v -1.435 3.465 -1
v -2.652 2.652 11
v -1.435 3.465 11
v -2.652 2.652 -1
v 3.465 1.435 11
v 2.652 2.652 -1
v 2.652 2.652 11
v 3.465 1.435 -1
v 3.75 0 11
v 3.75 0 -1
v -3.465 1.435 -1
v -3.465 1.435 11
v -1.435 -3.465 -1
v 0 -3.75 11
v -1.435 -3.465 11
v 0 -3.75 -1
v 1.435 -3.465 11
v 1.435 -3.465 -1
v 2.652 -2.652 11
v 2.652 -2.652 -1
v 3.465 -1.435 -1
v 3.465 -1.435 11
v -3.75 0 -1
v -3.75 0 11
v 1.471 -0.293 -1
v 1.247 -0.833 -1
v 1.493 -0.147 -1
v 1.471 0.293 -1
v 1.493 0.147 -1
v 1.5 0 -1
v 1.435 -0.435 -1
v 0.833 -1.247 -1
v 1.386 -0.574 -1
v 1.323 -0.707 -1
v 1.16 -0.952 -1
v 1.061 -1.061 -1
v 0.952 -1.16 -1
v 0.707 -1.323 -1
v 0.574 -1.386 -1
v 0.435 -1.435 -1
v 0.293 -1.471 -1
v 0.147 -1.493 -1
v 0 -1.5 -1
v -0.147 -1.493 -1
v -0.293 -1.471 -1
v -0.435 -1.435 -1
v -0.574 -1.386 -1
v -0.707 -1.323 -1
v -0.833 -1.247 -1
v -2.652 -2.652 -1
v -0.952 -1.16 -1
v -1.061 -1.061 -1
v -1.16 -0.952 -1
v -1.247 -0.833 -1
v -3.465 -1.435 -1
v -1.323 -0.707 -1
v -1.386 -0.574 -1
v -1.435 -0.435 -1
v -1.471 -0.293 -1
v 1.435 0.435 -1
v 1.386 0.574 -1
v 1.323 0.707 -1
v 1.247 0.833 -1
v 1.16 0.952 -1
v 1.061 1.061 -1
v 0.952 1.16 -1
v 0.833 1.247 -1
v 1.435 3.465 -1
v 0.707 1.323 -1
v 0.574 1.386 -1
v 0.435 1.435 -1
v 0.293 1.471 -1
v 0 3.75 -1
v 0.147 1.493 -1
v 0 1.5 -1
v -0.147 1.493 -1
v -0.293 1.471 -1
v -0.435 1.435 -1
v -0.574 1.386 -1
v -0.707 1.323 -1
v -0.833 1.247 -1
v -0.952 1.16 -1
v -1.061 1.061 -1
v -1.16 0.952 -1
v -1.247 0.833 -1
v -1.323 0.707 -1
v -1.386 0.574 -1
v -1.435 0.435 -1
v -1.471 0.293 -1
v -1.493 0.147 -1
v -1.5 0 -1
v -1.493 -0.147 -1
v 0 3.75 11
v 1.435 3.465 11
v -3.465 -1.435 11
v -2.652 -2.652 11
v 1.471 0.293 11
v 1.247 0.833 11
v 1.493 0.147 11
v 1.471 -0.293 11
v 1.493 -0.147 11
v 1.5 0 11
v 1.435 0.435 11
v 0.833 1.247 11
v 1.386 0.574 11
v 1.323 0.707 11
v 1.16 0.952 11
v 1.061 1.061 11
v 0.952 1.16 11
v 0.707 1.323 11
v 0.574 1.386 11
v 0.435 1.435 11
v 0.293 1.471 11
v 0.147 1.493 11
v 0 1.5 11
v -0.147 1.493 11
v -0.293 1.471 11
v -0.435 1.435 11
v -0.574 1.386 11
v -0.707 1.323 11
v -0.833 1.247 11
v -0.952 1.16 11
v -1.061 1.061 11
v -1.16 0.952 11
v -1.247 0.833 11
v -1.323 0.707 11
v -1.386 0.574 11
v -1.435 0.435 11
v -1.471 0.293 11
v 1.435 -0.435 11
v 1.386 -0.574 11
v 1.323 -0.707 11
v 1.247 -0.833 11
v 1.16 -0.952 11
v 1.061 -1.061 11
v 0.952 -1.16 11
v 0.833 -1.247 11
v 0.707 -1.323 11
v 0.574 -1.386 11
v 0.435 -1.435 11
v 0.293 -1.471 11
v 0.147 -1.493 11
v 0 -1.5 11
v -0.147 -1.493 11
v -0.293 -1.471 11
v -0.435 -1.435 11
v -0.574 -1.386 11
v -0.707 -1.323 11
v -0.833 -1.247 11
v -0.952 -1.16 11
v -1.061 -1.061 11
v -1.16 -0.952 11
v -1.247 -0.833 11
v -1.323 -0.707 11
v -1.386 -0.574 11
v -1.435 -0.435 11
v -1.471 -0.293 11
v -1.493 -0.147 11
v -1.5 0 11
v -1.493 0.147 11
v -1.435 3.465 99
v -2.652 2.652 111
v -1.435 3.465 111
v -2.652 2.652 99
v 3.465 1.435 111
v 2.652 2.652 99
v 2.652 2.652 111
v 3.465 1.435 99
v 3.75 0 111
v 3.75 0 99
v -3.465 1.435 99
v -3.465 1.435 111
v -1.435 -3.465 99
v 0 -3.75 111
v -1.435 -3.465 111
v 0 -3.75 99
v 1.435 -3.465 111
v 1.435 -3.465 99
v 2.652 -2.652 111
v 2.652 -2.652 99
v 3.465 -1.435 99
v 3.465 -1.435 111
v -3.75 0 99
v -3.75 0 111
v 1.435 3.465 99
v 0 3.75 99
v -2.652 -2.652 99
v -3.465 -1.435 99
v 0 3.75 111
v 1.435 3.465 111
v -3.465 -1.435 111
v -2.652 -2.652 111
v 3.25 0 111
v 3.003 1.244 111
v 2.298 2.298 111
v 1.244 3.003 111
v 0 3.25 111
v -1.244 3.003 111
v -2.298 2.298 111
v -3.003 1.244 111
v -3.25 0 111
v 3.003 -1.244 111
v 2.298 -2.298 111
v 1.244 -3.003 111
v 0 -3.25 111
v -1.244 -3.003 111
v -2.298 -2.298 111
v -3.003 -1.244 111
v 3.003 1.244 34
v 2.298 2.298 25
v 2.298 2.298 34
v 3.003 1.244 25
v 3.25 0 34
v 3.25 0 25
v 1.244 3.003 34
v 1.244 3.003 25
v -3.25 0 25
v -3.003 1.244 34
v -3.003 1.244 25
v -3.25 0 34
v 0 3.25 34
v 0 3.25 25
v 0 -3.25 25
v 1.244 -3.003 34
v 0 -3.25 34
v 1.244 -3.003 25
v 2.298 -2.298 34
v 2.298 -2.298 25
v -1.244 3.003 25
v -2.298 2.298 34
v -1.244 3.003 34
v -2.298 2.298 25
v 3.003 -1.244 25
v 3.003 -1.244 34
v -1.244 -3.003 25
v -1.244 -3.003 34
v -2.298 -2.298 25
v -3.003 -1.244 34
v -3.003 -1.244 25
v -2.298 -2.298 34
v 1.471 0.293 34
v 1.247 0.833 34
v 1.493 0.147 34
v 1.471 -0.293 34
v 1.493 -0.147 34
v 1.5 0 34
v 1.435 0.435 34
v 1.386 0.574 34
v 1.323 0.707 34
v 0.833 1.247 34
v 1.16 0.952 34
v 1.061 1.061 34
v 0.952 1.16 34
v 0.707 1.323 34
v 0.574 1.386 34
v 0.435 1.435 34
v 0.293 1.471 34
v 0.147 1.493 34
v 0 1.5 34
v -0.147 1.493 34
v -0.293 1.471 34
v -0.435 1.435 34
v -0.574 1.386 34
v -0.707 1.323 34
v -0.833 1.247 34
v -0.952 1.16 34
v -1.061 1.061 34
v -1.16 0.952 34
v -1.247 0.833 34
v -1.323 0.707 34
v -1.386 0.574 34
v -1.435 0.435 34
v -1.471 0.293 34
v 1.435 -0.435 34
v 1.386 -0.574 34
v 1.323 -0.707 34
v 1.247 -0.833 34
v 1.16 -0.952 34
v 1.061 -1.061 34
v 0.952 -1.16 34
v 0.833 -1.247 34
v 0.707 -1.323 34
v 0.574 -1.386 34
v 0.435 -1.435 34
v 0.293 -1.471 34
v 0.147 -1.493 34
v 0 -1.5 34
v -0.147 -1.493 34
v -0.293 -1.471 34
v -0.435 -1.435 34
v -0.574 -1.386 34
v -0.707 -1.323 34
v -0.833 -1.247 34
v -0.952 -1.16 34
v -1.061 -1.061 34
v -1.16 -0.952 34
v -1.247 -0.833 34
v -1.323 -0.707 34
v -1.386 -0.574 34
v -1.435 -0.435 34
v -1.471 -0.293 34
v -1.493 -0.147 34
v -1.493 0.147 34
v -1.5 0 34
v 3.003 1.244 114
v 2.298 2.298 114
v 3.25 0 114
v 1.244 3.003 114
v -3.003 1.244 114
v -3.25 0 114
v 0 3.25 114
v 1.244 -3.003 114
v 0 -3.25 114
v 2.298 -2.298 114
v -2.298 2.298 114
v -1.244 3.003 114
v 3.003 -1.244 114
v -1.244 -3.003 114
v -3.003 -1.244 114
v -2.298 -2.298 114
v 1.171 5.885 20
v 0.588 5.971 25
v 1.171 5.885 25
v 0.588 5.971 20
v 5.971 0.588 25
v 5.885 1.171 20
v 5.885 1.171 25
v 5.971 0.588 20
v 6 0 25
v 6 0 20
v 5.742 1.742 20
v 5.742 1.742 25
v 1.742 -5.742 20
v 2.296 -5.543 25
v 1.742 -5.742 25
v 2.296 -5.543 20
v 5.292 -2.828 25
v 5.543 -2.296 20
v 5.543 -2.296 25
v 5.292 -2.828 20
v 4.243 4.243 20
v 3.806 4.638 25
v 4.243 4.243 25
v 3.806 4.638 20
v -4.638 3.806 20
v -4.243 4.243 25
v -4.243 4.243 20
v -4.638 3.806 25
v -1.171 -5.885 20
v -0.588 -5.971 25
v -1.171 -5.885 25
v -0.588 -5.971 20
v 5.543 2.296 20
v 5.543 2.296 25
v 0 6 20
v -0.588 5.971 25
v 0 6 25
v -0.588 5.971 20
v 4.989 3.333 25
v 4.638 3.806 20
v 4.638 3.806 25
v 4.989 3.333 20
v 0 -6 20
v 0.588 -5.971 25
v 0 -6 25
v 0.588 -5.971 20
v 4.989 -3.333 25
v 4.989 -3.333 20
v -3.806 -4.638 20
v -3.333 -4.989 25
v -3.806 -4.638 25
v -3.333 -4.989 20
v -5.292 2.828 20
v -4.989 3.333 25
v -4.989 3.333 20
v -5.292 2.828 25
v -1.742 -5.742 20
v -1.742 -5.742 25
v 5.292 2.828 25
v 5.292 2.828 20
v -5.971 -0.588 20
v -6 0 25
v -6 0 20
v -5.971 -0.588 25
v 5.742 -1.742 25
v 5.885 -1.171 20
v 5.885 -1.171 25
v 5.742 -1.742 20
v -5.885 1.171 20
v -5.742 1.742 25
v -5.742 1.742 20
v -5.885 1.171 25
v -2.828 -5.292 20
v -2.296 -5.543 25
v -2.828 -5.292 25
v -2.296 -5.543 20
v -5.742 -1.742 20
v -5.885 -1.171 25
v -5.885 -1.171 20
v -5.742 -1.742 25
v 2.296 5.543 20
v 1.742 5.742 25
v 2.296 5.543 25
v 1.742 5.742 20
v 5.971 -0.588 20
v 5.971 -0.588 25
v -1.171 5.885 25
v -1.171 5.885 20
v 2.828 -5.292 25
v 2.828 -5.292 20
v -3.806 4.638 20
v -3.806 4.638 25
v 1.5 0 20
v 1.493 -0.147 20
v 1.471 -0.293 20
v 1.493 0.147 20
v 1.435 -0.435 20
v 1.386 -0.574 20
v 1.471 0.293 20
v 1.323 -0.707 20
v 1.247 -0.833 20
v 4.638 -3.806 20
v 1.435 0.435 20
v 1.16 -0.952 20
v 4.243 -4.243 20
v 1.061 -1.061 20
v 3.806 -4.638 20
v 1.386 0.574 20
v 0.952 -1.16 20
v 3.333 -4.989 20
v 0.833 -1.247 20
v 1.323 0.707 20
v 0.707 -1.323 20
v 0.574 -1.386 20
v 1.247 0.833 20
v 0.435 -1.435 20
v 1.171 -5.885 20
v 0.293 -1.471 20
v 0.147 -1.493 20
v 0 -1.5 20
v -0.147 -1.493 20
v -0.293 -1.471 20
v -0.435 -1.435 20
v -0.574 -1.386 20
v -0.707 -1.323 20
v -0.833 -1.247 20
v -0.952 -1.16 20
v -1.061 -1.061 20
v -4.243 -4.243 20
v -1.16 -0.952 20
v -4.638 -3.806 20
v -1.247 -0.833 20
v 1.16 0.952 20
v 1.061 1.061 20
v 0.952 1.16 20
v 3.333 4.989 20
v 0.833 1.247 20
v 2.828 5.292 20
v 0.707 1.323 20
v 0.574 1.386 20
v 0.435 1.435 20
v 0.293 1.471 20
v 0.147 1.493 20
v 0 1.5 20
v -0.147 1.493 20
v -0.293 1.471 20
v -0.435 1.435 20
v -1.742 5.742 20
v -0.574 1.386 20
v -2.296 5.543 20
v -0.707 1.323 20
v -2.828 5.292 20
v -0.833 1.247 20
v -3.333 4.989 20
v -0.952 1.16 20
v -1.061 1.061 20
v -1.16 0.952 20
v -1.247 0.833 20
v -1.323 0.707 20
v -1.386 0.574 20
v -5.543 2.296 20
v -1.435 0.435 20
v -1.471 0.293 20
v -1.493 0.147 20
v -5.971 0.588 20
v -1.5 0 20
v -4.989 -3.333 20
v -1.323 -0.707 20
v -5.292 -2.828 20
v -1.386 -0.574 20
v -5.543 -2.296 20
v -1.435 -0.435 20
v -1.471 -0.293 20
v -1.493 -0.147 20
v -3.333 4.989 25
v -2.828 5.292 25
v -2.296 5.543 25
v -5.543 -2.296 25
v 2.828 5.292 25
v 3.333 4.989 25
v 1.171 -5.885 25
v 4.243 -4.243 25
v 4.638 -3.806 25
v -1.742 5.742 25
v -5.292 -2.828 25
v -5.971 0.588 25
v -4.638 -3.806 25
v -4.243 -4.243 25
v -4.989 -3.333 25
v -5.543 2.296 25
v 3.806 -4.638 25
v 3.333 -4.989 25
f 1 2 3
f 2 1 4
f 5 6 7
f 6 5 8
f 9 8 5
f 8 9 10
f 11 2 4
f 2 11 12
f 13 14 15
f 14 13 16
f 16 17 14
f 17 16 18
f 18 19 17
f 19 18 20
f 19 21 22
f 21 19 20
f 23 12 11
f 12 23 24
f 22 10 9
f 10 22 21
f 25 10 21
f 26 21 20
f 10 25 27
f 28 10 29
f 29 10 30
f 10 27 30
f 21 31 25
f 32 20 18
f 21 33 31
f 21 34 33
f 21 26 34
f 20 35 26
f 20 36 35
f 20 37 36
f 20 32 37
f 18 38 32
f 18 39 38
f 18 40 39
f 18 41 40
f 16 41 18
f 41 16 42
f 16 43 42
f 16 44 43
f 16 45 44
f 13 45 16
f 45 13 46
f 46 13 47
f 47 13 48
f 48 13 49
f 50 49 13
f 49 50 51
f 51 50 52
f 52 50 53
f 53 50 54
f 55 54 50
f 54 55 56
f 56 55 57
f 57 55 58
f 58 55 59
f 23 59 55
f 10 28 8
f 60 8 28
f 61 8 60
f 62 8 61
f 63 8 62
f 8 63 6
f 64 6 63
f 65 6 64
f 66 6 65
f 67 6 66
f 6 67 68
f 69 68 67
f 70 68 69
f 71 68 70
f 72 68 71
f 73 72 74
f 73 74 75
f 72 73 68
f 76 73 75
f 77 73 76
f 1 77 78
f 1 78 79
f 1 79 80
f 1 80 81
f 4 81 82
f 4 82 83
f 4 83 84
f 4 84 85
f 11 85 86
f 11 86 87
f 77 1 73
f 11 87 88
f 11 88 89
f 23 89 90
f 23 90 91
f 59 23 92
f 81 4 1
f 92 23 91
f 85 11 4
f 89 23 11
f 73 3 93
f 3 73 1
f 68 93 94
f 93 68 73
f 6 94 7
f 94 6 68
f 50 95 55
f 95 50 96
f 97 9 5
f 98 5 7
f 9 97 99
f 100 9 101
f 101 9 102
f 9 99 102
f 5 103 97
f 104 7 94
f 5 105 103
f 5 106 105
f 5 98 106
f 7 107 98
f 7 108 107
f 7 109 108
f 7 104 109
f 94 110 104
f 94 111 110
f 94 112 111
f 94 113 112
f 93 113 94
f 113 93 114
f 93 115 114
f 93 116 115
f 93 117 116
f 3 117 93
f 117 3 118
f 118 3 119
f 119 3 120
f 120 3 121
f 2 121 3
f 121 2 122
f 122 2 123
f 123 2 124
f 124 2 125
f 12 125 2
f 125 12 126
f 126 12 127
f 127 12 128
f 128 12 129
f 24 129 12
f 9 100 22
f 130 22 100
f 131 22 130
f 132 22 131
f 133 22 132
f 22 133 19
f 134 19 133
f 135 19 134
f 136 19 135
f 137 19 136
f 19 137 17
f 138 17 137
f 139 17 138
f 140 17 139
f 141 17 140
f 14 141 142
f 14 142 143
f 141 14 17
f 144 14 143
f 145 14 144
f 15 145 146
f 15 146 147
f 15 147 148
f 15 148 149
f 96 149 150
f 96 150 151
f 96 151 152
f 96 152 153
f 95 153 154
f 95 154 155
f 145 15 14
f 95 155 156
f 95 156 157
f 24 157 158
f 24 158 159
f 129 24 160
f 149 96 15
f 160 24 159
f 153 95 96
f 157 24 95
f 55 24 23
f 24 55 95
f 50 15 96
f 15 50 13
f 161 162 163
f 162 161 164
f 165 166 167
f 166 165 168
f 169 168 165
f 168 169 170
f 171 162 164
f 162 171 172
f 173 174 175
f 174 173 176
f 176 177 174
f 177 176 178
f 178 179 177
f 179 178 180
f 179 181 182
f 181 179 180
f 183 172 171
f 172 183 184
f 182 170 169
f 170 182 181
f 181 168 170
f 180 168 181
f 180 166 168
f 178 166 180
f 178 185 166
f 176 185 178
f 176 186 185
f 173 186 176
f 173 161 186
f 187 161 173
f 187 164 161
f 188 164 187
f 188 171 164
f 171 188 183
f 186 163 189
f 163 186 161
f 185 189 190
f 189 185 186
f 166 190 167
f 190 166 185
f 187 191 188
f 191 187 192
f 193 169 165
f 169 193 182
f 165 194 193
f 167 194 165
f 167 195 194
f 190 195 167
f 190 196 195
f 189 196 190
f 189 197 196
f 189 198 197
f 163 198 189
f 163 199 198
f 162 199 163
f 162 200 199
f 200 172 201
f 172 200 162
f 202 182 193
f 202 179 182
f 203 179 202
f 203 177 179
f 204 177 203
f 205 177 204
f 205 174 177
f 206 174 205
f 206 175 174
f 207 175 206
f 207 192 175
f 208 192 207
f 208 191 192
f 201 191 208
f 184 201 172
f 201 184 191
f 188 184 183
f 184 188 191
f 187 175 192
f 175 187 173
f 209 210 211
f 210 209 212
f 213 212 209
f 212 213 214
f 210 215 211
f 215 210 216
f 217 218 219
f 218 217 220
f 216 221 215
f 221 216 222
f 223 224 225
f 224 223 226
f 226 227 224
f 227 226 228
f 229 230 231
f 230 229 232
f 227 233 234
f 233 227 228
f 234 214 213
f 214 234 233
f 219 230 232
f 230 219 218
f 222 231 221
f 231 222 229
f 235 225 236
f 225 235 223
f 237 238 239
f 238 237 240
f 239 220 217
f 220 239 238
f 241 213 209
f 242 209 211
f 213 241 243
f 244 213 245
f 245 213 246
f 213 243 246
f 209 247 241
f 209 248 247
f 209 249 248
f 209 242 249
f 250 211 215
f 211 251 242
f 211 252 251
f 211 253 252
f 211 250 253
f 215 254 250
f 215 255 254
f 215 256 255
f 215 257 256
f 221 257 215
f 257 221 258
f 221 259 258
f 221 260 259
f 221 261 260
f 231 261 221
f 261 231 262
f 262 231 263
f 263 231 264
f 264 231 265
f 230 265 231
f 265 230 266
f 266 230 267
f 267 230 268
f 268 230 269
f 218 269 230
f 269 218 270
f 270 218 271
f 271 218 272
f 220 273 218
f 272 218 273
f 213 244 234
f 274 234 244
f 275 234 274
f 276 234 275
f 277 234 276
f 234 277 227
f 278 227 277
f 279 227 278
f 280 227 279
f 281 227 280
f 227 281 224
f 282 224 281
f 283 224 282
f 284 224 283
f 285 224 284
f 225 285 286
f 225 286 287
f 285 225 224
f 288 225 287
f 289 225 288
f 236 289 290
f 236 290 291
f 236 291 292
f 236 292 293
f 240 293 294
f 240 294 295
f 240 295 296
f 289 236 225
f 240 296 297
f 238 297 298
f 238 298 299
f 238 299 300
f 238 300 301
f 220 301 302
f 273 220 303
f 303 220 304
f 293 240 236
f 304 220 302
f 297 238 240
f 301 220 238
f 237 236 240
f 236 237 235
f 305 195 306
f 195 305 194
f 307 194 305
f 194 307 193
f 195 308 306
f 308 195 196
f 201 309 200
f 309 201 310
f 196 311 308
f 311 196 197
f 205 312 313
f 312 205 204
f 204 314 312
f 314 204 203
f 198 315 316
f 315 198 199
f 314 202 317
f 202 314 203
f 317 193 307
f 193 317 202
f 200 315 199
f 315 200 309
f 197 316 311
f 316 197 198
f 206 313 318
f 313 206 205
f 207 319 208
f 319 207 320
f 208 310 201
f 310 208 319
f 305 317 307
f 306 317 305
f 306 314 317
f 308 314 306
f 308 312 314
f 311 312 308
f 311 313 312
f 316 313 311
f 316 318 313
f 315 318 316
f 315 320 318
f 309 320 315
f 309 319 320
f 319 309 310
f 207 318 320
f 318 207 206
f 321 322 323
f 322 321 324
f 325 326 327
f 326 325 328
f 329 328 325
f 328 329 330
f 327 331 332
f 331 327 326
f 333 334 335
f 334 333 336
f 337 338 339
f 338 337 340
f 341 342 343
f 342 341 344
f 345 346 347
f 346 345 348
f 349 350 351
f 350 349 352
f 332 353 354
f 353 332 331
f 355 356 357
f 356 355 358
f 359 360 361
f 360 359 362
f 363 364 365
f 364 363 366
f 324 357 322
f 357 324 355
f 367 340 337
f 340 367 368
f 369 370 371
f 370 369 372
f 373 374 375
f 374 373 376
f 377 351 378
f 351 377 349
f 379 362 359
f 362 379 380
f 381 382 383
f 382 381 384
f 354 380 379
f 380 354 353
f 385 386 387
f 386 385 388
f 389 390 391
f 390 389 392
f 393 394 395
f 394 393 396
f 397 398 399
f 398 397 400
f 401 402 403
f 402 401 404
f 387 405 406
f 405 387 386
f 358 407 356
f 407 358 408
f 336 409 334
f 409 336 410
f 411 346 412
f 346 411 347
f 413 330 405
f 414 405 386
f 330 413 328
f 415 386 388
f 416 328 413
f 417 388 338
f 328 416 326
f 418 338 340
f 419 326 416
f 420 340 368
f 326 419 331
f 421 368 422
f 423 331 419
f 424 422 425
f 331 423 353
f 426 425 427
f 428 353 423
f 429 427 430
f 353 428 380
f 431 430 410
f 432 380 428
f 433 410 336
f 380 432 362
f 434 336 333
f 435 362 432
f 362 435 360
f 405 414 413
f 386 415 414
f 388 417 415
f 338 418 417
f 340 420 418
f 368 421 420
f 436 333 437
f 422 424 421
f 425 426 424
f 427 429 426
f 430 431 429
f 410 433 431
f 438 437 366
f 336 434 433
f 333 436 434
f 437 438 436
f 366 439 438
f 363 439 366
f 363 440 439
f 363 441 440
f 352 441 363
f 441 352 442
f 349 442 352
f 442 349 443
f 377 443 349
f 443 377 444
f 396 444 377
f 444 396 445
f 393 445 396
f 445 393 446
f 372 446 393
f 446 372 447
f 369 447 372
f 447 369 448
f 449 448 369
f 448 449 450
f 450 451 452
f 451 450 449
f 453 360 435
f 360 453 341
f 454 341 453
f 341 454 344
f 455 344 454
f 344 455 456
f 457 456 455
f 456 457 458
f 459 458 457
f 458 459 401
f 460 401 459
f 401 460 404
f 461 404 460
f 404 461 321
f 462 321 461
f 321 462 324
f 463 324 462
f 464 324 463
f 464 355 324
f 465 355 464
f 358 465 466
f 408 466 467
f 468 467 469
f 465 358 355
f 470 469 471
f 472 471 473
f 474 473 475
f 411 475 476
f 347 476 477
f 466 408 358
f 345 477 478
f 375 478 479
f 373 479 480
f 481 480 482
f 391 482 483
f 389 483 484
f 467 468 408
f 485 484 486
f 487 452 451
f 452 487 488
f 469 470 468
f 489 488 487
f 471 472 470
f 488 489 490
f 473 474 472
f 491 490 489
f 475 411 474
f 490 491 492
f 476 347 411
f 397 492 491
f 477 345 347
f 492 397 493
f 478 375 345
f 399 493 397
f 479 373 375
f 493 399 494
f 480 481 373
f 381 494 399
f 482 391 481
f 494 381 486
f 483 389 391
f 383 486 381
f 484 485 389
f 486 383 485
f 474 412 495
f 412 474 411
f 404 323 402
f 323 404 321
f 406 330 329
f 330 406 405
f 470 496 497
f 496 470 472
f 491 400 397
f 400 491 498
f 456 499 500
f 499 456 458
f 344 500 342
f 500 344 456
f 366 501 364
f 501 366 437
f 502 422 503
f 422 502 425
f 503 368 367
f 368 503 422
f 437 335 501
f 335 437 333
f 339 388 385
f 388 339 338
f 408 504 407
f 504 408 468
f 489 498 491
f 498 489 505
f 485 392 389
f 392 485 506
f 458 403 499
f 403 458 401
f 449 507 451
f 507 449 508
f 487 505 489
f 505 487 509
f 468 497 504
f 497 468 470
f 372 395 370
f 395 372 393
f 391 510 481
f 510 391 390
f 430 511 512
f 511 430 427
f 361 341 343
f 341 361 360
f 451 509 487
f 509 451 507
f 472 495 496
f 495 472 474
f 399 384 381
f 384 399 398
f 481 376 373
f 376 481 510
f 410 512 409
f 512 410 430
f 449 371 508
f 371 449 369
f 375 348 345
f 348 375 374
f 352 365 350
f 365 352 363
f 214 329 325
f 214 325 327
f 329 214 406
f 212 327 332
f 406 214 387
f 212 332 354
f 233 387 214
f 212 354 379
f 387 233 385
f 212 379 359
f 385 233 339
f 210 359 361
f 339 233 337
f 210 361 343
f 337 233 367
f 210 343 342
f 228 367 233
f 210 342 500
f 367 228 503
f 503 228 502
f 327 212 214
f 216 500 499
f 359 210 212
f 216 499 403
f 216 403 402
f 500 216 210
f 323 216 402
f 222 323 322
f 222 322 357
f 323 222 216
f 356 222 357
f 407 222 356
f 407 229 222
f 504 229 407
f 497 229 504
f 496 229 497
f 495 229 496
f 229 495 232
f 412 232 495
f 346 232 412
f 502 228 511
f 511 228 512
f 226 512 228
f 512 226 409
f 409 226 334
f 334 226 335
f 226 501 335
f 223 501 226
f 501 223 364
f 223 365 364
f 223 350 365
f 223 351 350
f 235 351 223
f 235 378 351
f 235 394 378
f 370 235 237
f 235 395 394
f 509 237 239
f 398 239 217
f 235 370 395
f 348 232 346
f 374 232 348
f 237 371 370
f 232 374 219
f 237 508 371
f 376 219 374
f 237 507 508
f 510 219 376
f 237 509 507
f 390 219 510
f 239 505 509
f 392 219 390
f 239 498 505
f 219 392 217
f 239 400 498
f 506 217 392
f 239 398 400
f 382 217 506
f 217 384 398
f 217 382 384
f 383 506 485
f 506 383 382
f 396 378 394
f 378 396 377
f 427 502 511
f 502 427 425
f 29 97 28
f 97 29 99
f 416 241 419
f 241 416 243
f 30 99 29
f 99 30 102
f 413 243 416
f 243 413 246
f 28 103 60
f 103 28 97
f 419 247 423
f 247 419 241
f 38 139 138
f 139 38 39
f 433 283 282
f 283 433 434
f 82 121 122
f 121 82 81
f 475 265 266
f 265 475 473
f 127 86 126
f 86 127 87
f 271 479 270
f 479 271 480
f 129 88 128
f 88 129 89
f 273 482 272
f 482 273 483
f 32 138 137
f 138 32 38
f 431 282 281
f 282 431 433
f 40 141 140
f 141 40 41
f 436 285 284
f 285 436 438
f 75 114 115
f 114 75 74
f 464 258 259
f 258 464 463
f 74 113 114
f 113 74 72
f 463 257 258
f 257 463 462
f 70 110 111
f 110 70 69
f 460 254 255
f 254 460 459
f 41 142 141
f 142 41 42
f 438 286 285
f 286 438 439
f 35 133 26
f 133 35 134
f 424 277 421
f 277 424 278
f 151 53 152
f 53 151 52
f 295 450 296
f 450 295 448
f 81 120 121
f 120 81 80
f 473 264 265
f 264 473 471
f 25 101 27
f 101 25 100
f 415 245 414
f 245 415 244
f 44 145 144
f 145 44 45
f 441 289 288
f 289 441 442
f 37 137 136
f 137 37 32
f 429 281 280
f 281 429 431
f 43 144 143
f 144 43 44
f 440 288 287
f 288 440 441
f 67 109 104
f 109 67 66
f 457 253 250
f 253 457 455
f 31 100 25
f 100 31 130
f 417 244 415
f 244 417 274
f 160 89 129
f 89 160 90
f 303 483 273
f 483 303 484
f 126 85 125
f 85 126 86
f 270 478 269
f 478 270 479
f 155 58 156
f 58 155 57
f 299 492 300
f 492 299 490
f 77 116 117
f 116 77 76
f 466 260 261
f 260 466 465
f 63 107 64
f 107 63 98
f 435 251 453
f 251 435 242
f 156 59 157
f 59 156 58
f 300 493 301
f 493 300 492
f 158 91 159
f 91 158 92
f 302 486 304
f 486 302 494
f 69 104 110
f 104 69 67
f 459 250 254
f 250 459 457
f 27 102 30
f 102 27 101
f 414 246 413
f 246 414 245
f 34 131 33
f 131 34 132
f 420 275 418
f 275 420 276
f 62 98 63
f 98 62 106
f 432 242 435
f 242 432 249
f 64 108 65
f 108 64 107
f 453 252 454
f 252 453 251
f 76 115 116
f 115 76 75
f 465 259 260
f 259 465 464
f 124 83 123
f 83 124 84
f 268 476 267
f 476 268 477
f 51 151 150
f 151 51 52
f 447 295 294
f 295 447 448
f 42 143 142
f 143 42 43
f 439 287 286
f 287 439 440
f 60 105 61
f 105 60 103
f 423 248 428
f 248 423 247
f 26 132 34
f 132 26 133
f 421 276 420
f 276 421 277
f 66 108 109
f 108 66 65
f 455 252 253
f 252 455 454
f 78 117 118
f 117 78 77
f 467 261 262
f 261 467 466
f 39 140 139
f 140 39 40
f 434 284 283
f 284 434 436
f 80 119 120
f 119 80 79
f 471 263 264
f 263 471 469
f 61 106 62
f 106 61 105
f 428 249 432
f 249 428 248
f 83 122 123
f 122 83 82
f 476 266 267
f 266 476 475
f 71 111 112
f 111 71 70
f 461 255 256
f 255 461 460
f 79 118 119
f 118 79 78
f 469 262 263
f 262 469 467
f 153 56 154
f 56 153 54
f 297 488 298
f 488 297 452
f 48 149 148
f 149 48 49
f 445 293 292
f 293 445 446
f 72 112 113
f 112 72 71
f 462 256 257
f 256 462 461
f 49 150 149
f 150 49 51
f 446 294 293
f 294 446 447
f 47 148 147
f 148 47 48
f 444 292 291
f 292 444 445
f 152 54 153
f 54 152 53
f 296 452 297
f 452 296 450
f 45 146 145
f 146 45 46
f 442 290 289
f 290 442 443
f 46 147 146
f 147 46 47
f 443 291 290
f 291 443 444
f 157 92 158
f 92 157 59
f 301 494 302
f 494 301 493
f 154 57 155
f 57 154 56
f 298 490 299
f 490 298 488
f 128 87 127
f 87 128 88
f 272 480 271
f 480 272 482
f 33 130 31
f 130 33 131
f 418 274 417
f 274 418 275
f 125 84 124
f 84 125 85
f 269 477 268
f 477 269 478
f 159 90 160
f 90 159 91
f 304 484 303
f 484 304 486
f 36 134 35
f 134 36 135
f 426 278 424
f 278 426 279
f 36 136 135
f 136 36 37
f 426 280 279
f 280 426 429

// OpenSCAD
// Hose barb reducer - a straight reduction part with a through bore that joins two
// silicone tubing sizes, each size with a stacked pair of barbs. NOVEL general part.
//

t1   = 8;
t2   = 5;
bore = 3;
L    = 41;
g    = 1.5;

$fn = 64;

barb_d1 = 7.5;
barb_h1 = 10;

barb_d2 = 6.5;
barb_h2 = 8;

difference() {
    union() {
        for (z = [0, 10])
            translate([0, 0, z * 10])
                barb(barb_d1, barb_h1);
        translate([0, 0, 20]) cylinder(h = 5, d = 12);
        for (z = [0, 10])
            translate([0, 0, 25 + z * 8])
                barb(barb_d2, barb_h2);
    }
    translate([0, 0, -1]) cylinder(h = L + 2, d = bore);
}

module barb(d, h) {
    $fn = 16;
    translate([0, 0, -1])
        union() {
            cylinder(h = h + 2, d = d);
            cylinder(h = 1, d1 = d, d2 = d - 2 * g);   // shoulder
            translate([0, 0, h])
                cylinder(h = 1, d1 = d - 2 * g, d2 = d - 2 * g - 2 * g);   // tip
        }
}
